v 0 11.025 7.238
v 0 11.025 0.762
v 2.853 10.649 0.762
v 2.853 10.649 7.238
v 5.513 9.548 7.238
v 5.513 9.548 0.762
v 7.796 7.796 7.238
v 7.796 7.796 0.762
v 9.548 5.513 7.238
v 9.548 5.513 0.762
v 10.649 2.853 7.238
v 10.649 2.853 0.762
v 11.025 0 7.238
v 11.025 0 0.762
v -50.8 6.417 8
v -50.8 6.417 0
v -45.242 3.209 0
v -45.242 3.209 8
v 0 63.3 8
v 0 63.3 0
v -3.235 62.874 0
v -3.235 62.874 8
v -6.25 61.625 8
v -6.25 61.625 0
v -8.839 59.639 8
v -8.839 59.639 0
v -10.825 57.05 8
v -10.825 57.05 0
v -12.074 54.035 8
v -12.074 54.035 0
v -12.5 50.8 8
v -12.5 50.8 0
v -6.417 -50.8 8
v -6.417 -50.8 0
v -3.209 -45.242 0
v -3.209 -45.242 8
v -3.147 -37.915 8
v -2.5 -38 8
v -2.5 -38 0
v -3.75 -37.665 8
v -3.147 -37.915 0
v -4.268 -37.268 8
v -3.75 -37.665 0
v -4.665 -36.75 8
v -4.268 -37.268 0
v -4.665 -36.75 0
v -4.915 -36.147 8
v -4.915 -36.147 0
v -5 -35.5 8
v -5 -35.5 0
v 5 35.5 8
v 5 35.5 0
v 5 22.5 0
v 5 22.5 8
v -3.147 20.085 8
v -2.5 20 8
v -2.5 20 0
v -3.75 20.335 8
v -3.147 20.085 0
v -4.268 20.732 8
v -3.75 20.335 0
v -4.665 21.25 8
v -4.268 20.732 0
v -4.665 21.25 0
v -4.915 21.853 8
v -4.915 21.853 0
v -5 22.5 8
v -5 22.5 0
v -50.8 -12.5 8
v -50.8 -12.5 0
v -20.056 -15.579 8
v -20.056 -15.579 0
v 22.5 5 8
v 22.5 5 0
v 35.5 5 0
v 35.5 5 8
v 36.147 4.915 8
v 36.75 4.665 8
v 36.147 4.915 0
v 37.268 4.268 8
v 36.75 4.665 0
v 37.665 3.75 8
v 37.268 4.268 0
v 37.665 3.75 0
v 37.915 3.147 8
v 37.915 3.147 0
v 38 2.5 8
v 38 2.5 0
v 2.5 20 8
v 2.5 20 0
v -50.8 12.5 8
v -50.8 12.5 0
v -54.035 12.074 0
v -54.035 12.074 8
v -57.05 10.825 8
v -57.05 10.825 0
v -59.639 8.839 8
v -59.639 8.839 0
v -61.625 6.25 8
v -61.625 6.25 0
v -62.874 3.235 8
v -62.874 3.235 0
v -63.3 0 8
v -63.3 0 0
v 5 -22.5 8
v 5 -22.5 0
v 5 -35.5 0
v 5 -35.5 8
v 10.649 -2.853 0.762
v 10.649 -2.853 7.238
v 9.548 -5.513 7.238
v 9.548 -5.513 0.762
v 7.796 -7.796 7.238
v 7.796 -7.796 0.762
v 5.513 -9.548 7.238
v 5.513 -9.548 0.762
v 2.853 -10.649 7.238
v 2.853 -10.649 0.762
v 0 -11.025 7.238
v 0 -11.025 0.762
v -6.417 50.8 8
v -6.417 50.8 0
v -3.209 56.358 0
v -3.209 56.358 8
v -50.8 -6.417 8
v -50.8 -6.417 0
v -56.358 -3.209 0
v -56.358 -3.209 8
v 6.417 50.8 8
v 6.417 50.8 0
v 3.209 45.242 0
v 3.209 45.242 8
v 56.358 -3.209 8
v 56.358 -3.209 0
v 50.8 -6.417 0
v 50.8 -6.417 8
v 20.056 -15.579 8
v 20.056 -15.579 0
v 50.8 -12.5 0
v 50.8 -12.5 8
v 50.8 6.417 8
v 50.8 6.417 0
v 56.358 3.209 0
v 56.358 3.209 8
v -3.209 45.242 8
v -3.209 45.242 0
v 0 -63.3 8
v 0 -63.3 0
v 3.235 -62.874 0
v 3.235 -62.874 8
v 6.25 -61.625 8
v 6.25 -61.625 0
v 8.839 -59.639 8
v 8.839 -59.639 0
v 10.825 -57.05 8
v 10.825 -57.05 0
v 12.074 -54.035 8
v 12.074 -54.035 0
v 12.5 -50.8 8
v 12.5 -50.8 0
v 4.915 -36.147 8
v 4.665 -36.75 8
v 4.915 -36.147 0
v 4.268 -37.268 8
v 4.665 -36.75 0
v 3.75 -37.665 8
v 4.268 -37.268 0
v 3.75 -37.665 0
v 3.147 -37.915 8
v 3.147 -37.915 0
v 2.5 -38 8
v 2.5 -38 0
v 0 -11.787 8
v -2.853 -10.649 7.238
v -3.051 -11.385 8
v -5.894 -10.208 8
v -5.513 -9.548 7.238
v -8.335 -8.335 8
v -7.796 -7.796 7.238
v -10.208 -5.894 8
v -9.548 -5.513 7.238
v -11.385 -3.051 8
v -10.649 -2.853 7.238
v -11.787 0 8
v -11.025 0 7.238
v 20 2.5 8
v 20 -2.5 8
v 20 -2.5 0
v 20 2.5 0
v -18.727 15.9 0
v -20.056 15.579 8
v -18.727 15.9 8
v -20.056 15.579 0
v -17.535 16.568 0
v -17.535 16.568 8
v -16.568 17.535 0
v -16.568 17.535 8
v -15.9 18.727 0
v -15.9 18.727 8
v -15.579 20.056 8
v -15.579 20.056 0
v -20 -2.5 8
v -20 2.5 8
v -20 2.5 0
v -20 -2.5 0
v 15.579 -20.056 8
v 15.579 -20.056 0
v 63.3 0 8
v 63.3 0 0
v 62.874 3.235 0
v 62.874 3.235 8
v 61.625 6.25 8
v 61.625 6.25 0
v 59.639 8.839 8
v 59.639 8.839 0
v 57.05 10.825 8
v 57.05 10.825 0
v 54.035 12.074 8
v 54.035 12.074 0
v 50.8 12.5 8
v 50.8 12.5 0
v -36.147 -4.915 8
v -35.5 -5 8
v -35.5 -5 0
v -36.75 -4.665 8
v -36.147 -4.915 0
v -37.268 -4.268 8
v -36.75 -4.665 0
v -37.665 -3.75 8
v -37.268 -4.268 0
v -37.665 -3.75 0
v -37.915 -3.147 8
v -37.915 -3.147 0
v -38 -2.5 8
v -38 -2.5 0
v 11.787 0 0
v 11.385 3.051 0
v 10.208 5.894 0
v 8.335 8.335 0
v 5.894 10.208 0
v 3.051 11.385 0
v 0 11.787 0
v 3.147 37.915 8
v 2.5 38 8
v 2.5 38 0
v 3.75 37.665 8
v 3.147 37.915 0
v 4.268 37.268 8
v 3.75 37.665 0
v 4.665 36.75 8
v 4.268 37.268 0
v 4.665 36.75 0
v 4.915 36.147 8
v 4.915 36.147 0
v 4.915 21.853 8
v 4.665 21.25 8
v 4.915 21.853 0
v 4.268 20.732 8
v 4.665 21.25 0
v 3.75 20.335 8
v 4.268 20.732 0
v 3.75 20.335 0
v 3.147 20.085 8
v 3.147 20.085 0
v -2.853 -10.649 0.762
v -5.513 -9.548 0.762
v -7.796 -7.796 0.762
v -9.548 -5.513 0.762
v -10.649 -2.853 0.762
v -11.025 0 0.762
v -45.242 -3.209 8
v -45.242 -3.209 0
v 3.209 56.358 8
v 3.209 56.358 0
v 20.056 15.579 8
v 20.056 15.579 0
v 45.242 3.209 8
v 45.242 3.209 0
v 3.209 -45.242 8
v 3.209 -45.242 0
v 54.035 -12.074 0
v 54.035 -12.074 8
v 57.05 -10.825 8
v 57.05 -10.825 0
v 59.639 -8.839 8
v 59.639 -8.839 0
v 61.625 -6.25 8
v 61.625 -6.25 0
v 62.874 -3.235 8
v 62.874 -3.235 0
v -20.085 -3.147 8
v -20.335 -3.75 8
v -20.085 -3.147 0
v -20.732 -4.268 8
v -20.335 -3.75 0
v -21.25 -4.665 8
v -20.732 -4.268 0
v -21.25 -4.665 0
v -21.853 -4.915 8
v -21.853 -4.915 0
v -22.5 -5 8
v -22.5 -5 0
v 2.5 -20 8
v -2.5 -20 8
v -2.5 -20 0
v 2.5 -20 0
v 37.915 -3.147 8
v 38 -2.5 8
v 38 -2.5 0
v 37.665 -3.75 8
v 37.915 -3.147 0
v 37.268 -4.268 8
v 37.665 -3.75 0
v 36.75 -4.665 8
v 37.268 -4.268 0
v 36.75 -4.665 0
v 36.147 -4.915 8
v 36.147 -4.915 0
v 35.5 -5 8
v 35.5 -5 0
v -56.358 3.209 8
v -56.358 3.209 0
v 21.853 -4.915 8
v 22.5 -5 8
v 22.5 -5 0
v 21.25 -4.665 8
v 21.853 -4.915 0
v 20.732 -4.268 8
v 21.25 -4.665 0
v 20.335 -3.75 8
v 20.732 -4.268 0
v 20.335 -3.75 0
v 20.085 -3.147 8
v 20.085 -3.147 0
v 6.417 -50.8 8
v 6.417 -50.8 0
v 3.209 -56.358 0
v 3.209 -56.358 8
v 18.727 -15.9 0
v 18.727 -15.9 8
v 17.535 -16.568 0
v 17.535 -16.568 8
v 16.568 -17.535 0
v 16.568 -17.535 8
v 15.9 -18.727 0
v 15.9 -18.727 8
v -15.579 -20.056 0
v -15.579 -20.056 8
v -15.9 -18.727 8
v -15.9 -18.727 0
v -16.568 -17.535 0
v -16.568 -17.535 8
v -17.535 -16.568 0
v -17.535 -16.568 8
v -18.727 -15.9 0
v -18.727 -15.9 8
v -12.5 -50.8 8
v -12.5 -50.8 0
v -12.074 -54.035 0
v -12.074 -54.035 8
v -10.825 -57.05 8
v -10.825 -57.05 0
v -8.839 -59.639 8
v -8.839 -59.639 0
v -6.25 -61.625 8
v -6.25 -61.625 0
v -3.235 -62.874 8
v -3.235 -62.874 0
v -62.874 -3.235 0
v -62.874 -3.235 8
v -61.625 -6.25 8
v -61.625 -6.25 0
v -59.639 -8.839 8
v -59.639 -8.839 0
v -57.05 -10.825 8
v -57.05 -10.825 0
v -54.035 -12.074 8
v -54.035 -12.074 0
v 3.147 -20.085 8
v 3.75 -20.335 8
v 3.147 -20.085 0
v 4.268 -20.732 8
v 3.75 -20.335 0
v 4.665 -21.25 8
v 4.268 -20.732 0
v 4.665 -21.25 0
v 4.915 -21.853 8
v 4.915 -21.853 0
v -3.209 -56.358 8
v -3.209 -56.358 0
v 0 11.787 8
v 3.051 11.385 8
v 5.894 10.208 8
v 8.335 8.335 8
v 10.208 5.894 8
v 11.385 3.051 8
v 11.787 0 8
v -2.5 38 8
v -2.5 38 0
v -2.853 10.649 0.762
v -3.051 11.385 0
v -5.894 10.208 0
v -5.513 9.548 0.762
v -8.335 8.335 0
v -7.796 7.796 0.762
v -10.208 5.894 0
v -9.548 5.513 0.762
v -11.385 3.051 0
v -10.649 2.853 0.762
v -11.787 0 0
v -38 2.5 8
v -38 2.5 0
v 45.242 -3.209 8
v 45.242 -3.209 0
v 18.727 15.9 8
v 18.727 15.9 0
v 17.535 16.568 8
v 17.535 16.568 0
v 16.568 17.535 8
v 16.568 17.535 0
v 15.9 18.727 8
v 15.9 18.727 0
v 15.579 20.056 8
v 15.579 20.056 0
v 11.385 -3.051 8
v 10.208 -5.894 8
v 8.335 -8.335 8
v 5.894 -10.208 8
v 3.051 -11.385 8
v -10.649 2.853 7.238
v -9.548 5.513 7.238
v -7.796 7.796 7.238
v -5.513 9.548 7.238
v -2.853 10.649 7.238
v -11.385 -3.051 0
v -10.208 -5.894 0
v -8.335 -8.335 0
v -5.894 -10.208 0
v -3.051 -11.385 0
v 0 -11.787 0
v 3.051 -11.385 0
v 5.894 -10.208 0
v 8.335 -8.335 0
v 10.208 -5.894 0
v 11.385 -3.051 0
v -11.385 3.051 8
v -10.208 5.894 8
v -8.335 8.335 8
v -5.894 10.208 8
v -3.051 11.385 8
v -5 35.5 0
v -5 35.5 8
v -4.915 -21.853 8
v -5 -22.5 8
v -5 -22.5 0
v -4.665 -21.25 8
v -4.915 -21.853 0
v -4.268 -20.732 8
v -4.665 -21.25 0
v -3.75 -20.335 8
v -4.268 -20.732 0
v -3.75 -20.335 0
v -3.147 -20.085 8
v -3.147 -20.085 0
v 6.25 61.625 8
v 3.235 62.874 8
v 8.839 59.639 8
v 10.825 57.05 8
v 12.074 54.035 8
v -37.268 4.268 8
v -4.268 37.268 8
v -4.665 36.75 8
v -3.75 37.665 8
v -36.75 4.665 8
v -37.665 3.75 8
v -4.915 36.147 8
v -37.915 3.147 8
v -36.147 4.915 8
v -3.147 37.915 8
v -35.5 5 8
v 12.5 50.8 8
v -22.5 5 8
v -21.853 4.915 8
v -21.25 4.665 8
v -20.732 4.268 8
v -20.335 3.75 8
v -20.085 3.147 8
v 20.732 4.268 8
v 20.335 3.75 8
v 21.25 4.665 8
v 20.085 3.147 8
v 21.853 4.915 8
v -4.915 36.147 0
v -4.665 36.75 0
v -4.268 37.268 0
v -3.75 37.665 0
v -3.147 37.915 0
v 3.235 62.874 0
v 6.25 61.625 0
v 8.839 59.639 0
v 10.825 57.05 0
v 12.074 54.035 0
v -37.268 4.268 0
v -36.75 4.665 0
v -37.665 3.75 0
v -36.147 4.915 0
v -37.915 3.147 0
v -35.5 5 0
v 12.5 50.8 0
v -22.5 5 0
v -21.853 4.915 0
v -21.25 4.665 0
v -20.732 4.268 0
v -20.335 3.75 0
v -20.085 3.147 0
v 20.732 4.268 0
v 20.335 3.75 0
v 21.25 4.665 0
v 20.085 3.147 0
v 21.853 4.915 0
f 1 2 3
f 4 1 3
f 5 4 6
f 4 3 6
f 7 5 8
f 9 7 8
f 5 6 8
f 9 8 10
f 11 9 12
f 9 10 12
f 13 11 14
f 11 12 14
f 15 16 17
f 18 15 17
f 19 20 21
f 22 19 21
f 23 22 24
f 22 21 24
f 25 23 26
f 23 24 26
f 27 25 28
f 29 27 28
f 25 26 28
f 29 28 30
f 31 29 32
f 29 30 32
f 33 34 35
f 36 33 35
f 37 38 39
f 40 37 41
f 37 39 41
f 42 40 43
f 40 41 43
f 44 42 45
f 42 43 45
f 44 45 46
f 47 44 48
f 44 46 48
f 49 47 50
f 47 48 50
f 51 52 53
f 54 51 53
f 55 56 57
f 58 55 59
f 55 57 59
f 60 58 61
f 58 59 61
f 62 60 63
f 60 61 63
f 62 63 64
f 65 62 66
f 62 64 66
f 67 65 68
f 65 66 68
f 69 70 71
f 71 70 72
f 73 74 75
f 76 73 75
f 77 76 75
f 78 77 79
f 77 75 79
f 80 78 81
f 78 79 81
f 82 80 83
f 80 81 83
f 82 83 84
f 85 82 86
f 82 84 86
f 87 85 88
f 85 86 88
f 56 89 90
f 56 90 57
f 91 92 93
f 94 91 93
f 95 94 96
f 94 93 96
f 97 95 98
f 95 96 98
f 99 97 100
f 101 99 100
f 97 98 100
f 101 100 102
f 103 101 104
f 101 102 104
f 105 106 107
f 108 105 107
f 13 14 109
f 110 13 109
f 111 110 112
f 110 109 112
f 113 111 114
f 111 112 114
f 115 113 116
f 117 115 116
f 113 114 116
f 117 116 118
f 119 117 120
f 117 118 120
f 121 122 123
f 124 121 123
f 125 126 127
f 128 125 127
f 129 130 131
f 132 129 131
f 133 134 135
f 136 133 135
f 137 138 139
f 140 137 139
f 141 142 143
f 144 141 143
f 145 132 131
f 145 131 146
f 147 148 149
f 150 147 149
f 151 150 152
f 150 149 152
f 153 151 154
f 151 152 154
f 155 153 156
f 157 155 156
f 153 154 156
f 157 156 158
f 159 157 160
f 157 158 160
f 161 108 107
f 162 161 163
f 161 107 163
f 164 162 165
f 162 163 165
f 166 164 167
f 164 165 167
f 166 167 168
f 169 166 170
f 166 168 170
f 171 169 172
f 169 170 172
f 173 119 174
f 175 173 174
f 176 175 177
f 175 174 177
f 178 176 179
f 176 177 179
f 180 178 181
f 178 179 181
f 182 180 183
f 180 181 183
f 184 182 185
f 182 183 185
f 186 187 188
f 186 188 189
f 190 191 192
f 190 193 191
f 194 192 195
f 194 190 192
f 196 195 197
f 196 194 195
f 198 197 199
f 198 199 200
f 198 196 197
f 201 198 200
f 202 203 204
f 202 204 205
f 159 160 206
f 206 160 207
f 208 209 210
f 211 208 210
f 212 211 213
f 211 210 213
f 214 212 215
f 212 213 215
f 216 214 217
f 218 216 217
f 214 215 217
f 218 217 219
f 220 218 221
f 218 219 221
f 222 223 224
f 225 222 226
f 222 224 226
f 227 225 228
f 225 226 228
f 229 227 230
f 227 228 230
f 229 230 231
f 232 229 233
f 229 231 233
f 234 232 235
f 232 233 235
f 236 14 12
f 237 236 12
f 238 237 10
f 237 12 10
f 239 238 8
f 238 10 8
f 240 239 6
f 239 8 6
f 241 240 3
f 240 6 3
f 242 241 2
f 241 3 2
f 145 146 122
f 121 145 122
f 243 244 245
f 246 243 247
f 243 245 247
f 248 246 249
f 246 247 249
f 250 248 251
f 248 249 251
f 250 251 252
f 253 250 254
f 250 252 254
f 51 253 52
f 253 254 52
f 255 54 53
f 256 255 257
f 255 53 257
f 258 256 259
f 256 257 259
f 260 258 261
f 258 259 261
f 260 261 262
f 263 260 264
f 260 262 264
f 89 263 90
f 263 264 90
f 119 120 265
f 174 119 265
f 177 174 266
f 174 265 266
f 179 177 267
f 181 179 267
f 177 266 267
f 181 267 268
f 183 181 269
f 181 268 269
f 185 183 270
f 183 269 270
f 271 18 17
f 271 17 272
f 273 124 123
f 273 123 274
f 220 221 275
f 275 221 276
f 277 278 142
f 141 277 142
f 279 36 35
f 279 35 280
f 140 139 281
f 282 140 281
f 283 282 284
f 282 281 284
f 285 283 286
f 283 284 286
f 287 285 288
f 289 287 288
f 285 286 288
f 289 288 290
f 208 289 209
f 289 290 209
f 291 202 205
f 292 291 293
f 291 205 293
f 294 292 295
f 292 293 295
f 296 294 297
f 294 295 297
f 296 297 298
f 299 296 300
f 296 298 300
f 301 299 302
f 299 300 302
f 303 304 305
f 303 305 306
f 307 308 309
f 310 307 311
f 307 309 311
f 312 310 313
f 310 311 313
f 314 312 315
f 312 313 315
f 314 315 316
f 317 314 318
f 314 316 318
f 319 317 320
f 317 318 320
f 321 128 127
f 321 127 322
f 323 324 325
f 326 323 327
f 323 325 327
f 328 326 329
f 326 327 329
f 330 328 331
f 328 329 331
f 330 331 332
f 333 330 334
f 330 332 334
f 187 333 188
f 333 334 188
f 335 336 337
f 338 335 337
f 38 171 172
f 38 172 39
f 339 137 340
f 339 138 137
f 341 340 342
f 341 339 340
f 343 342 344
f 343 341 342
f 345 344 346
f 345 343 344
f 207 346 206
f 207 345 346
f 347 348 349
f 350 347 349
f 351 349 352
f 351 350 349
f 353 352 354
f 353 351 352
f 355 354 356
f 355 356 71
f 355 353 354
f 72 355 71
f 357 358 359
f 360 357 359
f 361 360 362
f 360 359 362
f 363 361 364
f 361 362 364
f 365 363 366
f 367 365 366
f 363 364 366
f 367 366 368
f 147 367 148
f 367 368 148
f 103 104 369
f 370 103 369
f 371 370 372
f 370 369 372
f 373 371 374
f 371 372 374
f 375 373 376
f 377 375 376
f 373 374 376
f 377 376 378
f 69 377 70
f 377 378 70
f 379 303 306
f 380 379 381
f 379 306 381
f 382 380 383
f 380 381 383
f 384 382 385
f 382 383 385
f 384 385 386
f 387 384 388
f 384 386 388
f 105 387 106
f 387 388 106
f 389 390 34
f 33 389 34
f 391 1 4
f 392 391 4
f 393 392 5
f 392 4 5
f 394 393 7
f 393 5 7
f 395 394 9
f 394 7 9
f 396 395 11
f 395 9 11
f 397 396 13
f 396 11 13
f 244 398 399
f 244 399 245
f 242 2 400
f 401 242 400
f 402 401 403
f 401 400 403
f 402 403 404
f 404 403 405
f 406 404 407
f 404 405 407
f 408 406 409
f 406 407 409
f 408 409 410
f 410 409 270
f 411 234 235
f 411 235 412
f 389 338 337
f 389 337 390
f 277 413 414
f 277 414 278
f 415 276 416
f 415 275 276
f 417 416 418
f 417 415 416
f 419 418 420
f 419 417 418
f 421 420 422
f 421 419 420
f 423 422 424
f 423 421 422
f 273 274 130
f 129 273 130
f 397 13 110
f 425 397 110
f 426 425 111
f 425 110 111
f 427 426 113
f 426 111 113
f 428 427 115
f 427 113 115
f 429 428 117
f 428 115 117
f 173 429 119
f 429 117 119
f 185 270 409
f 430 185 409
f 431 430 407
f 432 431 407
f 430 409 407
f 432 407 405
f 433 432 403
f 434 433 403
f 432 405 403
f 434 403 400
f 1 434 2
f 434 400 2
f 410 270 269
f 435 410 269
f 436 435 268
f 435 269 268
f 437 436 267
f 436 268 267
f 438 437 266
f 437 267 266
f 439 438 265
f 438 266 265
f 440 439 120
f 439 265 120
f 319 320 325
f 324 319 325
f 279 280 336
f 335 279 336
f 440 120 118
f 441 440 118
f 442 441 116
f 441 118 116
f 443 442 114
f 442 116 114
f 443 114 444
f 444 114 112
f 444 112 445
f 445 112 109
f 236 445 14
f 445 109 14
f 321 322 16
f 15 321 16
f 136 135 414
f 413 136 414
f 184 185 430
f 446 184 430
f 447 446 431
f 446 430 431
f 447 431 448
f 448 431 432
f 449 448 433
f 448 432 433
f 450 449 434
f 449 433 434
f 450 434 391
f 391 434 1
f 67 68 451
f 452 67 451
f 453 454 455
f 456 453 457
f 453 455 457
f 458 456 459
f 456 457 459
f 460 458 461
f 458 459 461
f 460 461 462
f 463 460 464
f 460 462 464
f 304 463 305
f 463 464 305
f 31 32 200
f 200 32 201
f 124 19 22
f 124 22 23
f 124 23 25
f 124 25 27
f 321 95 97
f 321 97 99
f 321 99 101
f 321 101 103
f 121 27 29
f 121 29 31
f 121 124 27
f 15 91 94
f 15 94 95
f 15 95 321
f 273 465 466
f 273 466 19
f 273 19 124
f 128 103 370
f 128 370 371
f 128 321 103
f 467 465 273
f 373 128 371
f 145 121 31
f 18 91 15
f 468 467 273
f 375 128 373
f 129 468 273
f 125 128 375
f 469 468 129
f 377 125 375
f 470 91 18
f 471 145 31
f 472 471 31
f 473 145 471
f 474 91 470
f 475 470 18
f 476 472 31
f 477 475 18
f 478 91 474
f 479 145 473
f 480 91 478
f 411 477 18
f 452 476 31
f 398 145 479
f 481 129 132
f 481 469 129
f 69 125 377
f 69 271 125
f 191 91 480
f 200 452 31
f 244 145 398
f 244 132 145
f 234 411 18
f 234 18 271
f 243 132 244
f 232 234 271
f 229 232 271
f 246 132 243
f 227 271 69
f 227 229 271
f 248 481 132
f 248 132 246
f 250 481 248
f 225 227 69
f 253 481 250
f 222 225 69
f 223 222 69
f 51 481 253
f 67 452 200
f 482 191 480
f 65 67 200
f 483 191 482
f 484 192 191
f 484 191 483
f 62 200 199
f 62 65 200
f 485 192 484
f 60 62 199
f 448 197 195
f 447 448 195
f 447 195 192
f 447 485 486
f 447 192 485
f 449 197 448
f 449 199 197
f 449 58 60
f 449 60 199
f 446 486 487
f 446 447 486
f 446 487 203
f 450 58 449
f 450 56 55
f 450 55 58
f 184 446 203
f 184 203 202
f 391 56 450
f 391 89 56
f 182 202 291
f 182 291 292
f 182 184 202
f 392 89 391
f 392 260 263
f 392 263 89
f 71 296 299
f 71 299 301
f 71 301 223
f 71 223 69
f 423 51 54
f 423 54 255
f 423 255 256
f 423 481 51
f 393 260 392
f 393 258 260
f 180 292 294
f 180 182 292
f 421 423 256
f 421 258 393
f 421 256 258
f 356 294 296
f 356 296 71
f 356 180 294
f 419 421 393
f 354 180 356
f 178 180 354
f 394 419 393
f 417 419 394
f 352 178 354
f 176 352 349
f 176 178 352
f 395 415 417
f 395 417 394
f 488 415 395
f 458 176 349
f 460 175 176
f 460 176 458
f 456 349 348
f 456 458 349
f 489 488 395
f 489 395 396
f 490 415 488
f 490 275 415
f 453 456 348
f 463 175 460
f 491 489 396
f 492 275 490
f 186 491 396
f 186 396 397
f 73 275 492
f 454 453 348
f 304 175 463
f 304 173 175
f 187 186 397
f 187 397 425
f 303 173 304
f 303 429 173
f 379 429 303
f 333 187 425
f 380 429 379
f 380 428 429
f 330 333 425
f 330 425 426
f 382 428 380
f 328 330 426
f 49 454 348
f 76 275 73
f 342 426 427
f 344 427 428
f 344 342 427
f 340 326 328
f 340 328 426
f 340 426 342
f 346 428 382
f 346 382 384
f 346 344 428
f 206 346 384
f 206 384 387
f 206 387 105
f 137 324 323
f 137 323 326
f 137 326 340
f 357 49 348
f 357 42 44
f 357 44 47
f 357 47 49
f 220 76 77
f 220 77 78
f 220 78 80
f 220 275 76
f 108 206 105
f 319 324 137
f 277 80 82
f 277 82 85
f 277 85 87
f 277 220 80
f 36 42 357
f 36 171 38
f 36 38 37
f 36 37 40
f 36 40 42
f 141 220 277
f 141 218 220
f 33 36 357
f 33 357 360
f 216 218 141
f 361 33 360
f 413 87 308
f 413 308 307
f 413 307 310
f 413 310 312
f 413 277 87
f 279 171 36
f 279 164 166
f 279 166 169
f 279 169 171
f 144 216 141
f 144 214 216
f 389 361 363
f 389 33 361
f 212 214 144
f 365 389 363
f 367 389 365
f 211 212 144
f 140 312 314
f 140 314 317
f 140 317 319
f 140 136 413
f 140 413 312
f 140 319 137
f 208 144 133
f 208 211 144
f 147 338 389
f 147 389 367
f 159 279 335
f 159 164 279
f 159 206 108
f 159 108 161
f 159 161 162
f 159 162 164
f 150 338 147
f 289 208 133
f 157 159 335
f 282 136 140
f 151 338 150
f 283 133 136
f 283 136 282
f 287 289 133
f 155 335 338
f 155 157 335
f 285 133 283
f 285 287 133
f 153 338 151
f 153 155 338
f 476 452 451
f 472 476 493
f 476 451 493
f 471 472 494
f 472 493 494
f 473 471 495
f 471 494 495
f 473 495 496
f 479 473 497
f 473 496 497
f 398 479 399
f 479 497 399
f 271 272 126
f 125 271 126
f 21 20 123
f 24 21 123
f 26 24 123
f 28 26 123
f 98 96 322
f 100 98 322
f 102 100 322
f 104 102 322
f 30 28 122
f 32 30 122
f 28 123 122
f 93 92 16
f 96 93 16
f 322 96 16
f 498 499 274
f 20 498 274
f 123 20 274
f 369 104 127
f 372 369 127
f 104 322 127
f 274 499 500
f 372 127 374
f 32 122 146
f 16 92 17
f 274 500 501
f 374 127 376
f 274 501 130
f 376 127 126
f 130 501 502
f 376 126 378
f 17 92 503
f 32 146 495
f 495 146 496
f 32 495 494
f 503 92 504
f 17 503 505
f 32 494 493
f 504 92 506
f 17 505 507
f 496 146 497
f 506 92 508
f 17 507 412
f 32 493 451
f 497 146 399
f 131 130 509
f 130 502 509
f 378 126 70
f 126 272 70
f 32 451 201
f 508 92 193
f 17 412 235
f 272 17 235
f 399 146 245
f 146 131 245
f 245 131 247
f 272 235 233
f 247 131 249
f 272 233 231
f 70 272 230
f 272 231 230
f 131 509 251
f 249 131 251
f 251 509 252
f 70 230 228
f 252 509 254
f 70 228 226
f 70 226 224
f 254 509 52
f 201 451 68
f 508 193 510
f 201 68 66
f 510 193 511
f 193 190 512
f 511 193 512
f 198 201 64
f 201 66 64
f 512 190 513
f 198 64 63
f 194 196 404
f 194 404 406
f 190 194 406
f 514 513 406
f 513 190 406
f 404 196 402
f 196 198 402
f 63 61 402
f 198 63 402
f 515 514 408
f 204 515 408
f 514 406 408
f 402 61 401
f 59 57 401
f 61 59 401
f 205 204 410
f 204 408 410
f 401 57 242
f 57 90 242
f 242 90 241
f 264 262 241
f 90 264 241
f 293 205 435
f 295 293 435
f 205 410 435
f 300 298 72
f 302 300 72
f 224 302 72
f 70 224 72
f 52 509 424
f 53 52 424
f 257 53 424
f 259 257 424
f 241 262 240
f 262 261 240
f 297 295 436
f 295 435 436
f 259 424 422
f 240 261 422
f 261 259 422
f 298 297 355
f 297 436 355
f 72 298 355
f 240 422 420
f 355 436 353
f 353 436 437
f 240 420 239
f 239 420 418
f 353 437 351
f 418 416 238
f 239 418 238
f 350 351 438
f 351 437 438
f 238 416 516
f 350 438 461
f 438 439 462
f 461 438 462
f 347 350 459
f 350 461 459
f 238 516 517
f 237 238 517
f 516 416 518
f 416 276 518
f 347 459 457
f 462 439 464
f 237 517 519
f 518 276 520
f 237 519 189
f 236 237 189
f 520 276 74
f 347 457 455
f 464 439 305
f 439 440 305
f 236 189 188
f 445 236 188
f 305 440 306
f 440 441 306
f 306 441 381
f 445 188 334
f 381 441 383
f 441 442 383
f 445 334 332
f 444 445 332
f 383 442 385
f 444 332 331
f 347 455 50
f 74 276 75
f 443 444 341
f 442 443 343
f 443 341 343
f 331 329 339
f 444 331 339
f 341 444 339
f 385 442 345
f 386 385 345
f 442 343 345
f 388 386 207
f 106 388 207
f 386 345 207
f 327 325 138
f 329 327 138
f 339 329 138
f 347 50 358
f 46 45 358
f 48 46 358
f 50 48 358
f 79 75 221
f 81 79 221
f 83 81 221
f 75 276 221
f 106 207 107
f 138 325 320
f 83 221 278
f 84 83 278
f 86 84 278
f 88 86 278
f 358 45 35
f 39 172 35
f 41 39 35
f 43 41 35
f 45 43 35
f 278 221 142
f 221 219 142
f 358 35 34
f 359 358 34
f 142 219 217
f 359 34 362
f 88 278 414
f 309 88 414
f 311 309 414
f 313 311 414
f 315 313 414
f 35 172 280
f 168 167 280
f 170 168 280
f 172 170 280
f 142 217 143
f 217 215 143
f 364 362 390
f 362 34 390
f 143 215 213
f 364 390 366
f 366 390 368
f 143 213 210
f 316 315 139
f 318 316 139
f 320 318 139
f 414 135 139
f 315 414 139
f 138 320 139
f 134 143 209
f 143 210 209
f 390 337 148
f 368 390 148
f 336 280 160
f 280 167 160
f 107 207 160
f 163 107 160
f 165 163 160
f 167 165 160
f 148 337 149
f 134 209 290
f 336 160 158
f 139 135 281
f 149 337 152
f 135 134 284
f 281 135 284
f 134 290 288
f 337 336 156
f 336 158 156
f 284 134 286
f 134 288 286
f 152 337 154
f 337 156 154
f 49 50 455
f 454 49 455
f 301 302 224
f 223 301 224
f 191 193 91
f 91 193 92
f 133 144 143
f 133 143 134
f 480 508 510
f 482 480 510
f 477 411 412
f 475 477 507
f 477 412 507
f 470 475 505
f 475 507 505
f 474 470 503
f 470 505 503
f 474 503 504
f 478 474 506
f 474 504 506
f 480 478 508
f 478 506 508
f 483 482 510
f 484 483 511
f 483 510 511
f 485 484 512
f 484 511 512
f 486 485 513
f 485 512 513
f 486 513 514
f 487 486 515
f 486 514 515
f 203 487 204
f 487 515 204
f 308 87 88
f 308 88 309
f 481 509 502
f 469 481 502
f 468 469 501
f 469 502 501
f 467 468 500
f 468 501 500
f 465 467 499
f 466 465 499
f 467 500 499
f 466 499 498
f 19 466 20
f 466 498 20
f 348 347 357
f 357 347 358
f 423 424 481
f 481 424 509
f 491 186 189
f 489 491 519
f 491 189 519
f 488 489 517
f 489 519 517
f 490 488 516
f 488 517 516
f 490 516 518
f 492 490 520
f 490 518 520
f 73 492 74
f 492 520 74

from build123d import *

# Parameters (mm, degrees)
F1_DEPTH = 8
F3_COUNT = 4
F4_R     = 5
F5_SIZE  = 0.762


with BuildPart() as f1:
    # F0 (on Top) → F1 (new body)
    with BuildSketch(Plane.XY):
        with BuildLine():
            ThreePointArc((0, 63.3), (-8.8388347648, 59.6388347648), (-12.5, 50.8))
            Line((-12.5, 50.8), (-6.4172713361, 50.8))
            Line((-6.4172713361, 50.8), (-3.208635668, 56.35752))
            Line((-3.208635668, 56.35752), (0, 56.35752))
            Line((0, 56.35752), (0, 63.3))
        make_face()
        with BuildLine():
            Line((6.4172713361, 50.8), (12.5, 50.8))
            ThreePointArc((12.5, 50.8), (8.8388347648, 59.6388347648), (0, 63.3))
            Line((0, 63.3), (0, 56.35752))
            Line((0, 56.35752), (3.208635668, 56.35752))
            Line((3.208635668, 56.35752), (6.4172713361, 50.8))
        make_face()
        with BuildLine():
            ThreePointArc((0, 38.3), (8.8388347648, 41.9611652352), (12.5, 50.8))
            Line((12.5, 50.8), (6.4172713361, 50.8))
            Line((6.4172713361, 50.8), (3.208635668, 45.24248))
            Line((3.208635668, 45.24248), (0, 45.24248))
            Line((0, 45.24248), (0, 38.3))
        make_face()
        with BuildLine():
            Line((-6.4172713361, 50.8), (-12.5, 50.8))
            ThreePointArc((-12.5, 50.8), (-8.8388347648, 41.9611652352), (0, 38.3))
            Line((0, 38.3), (0, 45.24248))
            Line((0, 45.24248), (-3.208635668, 45.24248))
            Line((-3.208635668, 45.24248), (-6.4172713361, 50.8))
        make_face()
        with BuildLine():
            ThreePointArc((-17.4128947138, 1.7438743322), (-11.7416395615, 12.9762822259), (0, 17.5))
            Line((0, 17.5), (0, 20))
            Line((0, 20), (-2.5, 20))
            ThreePointArc((-2.5, 20), (-4.267766953, 20.732233047), (-5, 22.5))
            Line((-5, 22.5), (-5, 35.5))
            ThreePointArc((-5, 35.5), (-4.267766953, 37.267766953), (-2.5, 38))
            Line((-2.5, 38), (0, 38))
            Line((0, 38), (0, 38.3))
            ThreePointArc((0, 38.3), (-8.8388347648, 41.9611652352), (-12.5, 50.8))
            Line((-12.5, 50.8), (-17.4128947138, 1.7438743322))
        make_face()
        with BuildLine():
            Line((0, 20), (0, 17.5))
            ThreePointArc((0, 17.5), (11.7416395615, 12.9762822259), (17.4128947138, 1.7438743322))
            Line((17.4128947138, 1.7438743322), (12.5, 50.8))
            ThreePointArc((12.5, 50.8), (8.8388347648, 41.9611652352), (0, 38.3))
            Line((0, 38.3), (0, 38))
            Line((0, 38), (2.5, 38))
            ThreePointArc((2.5, 38), (4.267766953, 37.267766953), (5, 35.5))
            Line((5, 35.5), (5, 22.5))
            ThreePointArc((5, 22.5), (4.267766953, 20.732233047), (2.5, 20))
            Line((2.5, 20), (0, 20))
        make_face()
        with BuildLine():
            ThreePointArc((17.4128947138, 1.7438743322), (11.7416395615, 12.9762822259), (0, 17.5))
            ThreePointArc((0, 17.5), (-11.7416395615, 12.9762822259), (-17.4128947138, 1.7438743322))
            ThreePointArc((-17.4128947138, 1.7438743322), (-0.8730242003, -17.4782101128), (17.5, 0))
            ThreePointArc((17.5, 0), (17.4782101128, 0.8730242003), (17.4128947138, 1.7438743322))
        make_face()
        with BuildLine():
            ThreePointArc((0, 11.025), (7.7958522626, 7.7958522626), (11.025, 0))
            ThreePointArc((11.025, 0), (-7.7958522626, -7.7958522626), (0, 11.025))
        make_face(mode=Mode.SUBTRACT)
    extrude(amount=F1_DEPTH)

    # F3: F1 ×4 about axis
    f3_axis = Axis((0, 0, 24.1194125265), (0, 0, 1))


with BuildPart() as f1_1:
    add(f1.part)
    for i in range(1, F3_COUNT):
        add(f1.part.rotate(f3_axis, i * 360 / F3_COUNT))

    # F4
    f4_edges = [f1_1.edges().sort_by_distance(p)[0] for p in [
        (15.986516, 15.986516, 4),
        (-15.986516, 15.986516, 4),
        (-15.986516, -15.986516, 4),
        (15.986516, -15.986516, 4),
    ]]
    fillet(f4_edges, radius=F4_R)

    # F5
    f5_edges = [f1_1.edges().sort_by_distance(p)[0] for p in [
        (0, -11.025, 8),
        (0, -11.025, 0),
    ]]
    chamfer(f5_edges, length=F5_SIZE)


solid = f1_1.part
